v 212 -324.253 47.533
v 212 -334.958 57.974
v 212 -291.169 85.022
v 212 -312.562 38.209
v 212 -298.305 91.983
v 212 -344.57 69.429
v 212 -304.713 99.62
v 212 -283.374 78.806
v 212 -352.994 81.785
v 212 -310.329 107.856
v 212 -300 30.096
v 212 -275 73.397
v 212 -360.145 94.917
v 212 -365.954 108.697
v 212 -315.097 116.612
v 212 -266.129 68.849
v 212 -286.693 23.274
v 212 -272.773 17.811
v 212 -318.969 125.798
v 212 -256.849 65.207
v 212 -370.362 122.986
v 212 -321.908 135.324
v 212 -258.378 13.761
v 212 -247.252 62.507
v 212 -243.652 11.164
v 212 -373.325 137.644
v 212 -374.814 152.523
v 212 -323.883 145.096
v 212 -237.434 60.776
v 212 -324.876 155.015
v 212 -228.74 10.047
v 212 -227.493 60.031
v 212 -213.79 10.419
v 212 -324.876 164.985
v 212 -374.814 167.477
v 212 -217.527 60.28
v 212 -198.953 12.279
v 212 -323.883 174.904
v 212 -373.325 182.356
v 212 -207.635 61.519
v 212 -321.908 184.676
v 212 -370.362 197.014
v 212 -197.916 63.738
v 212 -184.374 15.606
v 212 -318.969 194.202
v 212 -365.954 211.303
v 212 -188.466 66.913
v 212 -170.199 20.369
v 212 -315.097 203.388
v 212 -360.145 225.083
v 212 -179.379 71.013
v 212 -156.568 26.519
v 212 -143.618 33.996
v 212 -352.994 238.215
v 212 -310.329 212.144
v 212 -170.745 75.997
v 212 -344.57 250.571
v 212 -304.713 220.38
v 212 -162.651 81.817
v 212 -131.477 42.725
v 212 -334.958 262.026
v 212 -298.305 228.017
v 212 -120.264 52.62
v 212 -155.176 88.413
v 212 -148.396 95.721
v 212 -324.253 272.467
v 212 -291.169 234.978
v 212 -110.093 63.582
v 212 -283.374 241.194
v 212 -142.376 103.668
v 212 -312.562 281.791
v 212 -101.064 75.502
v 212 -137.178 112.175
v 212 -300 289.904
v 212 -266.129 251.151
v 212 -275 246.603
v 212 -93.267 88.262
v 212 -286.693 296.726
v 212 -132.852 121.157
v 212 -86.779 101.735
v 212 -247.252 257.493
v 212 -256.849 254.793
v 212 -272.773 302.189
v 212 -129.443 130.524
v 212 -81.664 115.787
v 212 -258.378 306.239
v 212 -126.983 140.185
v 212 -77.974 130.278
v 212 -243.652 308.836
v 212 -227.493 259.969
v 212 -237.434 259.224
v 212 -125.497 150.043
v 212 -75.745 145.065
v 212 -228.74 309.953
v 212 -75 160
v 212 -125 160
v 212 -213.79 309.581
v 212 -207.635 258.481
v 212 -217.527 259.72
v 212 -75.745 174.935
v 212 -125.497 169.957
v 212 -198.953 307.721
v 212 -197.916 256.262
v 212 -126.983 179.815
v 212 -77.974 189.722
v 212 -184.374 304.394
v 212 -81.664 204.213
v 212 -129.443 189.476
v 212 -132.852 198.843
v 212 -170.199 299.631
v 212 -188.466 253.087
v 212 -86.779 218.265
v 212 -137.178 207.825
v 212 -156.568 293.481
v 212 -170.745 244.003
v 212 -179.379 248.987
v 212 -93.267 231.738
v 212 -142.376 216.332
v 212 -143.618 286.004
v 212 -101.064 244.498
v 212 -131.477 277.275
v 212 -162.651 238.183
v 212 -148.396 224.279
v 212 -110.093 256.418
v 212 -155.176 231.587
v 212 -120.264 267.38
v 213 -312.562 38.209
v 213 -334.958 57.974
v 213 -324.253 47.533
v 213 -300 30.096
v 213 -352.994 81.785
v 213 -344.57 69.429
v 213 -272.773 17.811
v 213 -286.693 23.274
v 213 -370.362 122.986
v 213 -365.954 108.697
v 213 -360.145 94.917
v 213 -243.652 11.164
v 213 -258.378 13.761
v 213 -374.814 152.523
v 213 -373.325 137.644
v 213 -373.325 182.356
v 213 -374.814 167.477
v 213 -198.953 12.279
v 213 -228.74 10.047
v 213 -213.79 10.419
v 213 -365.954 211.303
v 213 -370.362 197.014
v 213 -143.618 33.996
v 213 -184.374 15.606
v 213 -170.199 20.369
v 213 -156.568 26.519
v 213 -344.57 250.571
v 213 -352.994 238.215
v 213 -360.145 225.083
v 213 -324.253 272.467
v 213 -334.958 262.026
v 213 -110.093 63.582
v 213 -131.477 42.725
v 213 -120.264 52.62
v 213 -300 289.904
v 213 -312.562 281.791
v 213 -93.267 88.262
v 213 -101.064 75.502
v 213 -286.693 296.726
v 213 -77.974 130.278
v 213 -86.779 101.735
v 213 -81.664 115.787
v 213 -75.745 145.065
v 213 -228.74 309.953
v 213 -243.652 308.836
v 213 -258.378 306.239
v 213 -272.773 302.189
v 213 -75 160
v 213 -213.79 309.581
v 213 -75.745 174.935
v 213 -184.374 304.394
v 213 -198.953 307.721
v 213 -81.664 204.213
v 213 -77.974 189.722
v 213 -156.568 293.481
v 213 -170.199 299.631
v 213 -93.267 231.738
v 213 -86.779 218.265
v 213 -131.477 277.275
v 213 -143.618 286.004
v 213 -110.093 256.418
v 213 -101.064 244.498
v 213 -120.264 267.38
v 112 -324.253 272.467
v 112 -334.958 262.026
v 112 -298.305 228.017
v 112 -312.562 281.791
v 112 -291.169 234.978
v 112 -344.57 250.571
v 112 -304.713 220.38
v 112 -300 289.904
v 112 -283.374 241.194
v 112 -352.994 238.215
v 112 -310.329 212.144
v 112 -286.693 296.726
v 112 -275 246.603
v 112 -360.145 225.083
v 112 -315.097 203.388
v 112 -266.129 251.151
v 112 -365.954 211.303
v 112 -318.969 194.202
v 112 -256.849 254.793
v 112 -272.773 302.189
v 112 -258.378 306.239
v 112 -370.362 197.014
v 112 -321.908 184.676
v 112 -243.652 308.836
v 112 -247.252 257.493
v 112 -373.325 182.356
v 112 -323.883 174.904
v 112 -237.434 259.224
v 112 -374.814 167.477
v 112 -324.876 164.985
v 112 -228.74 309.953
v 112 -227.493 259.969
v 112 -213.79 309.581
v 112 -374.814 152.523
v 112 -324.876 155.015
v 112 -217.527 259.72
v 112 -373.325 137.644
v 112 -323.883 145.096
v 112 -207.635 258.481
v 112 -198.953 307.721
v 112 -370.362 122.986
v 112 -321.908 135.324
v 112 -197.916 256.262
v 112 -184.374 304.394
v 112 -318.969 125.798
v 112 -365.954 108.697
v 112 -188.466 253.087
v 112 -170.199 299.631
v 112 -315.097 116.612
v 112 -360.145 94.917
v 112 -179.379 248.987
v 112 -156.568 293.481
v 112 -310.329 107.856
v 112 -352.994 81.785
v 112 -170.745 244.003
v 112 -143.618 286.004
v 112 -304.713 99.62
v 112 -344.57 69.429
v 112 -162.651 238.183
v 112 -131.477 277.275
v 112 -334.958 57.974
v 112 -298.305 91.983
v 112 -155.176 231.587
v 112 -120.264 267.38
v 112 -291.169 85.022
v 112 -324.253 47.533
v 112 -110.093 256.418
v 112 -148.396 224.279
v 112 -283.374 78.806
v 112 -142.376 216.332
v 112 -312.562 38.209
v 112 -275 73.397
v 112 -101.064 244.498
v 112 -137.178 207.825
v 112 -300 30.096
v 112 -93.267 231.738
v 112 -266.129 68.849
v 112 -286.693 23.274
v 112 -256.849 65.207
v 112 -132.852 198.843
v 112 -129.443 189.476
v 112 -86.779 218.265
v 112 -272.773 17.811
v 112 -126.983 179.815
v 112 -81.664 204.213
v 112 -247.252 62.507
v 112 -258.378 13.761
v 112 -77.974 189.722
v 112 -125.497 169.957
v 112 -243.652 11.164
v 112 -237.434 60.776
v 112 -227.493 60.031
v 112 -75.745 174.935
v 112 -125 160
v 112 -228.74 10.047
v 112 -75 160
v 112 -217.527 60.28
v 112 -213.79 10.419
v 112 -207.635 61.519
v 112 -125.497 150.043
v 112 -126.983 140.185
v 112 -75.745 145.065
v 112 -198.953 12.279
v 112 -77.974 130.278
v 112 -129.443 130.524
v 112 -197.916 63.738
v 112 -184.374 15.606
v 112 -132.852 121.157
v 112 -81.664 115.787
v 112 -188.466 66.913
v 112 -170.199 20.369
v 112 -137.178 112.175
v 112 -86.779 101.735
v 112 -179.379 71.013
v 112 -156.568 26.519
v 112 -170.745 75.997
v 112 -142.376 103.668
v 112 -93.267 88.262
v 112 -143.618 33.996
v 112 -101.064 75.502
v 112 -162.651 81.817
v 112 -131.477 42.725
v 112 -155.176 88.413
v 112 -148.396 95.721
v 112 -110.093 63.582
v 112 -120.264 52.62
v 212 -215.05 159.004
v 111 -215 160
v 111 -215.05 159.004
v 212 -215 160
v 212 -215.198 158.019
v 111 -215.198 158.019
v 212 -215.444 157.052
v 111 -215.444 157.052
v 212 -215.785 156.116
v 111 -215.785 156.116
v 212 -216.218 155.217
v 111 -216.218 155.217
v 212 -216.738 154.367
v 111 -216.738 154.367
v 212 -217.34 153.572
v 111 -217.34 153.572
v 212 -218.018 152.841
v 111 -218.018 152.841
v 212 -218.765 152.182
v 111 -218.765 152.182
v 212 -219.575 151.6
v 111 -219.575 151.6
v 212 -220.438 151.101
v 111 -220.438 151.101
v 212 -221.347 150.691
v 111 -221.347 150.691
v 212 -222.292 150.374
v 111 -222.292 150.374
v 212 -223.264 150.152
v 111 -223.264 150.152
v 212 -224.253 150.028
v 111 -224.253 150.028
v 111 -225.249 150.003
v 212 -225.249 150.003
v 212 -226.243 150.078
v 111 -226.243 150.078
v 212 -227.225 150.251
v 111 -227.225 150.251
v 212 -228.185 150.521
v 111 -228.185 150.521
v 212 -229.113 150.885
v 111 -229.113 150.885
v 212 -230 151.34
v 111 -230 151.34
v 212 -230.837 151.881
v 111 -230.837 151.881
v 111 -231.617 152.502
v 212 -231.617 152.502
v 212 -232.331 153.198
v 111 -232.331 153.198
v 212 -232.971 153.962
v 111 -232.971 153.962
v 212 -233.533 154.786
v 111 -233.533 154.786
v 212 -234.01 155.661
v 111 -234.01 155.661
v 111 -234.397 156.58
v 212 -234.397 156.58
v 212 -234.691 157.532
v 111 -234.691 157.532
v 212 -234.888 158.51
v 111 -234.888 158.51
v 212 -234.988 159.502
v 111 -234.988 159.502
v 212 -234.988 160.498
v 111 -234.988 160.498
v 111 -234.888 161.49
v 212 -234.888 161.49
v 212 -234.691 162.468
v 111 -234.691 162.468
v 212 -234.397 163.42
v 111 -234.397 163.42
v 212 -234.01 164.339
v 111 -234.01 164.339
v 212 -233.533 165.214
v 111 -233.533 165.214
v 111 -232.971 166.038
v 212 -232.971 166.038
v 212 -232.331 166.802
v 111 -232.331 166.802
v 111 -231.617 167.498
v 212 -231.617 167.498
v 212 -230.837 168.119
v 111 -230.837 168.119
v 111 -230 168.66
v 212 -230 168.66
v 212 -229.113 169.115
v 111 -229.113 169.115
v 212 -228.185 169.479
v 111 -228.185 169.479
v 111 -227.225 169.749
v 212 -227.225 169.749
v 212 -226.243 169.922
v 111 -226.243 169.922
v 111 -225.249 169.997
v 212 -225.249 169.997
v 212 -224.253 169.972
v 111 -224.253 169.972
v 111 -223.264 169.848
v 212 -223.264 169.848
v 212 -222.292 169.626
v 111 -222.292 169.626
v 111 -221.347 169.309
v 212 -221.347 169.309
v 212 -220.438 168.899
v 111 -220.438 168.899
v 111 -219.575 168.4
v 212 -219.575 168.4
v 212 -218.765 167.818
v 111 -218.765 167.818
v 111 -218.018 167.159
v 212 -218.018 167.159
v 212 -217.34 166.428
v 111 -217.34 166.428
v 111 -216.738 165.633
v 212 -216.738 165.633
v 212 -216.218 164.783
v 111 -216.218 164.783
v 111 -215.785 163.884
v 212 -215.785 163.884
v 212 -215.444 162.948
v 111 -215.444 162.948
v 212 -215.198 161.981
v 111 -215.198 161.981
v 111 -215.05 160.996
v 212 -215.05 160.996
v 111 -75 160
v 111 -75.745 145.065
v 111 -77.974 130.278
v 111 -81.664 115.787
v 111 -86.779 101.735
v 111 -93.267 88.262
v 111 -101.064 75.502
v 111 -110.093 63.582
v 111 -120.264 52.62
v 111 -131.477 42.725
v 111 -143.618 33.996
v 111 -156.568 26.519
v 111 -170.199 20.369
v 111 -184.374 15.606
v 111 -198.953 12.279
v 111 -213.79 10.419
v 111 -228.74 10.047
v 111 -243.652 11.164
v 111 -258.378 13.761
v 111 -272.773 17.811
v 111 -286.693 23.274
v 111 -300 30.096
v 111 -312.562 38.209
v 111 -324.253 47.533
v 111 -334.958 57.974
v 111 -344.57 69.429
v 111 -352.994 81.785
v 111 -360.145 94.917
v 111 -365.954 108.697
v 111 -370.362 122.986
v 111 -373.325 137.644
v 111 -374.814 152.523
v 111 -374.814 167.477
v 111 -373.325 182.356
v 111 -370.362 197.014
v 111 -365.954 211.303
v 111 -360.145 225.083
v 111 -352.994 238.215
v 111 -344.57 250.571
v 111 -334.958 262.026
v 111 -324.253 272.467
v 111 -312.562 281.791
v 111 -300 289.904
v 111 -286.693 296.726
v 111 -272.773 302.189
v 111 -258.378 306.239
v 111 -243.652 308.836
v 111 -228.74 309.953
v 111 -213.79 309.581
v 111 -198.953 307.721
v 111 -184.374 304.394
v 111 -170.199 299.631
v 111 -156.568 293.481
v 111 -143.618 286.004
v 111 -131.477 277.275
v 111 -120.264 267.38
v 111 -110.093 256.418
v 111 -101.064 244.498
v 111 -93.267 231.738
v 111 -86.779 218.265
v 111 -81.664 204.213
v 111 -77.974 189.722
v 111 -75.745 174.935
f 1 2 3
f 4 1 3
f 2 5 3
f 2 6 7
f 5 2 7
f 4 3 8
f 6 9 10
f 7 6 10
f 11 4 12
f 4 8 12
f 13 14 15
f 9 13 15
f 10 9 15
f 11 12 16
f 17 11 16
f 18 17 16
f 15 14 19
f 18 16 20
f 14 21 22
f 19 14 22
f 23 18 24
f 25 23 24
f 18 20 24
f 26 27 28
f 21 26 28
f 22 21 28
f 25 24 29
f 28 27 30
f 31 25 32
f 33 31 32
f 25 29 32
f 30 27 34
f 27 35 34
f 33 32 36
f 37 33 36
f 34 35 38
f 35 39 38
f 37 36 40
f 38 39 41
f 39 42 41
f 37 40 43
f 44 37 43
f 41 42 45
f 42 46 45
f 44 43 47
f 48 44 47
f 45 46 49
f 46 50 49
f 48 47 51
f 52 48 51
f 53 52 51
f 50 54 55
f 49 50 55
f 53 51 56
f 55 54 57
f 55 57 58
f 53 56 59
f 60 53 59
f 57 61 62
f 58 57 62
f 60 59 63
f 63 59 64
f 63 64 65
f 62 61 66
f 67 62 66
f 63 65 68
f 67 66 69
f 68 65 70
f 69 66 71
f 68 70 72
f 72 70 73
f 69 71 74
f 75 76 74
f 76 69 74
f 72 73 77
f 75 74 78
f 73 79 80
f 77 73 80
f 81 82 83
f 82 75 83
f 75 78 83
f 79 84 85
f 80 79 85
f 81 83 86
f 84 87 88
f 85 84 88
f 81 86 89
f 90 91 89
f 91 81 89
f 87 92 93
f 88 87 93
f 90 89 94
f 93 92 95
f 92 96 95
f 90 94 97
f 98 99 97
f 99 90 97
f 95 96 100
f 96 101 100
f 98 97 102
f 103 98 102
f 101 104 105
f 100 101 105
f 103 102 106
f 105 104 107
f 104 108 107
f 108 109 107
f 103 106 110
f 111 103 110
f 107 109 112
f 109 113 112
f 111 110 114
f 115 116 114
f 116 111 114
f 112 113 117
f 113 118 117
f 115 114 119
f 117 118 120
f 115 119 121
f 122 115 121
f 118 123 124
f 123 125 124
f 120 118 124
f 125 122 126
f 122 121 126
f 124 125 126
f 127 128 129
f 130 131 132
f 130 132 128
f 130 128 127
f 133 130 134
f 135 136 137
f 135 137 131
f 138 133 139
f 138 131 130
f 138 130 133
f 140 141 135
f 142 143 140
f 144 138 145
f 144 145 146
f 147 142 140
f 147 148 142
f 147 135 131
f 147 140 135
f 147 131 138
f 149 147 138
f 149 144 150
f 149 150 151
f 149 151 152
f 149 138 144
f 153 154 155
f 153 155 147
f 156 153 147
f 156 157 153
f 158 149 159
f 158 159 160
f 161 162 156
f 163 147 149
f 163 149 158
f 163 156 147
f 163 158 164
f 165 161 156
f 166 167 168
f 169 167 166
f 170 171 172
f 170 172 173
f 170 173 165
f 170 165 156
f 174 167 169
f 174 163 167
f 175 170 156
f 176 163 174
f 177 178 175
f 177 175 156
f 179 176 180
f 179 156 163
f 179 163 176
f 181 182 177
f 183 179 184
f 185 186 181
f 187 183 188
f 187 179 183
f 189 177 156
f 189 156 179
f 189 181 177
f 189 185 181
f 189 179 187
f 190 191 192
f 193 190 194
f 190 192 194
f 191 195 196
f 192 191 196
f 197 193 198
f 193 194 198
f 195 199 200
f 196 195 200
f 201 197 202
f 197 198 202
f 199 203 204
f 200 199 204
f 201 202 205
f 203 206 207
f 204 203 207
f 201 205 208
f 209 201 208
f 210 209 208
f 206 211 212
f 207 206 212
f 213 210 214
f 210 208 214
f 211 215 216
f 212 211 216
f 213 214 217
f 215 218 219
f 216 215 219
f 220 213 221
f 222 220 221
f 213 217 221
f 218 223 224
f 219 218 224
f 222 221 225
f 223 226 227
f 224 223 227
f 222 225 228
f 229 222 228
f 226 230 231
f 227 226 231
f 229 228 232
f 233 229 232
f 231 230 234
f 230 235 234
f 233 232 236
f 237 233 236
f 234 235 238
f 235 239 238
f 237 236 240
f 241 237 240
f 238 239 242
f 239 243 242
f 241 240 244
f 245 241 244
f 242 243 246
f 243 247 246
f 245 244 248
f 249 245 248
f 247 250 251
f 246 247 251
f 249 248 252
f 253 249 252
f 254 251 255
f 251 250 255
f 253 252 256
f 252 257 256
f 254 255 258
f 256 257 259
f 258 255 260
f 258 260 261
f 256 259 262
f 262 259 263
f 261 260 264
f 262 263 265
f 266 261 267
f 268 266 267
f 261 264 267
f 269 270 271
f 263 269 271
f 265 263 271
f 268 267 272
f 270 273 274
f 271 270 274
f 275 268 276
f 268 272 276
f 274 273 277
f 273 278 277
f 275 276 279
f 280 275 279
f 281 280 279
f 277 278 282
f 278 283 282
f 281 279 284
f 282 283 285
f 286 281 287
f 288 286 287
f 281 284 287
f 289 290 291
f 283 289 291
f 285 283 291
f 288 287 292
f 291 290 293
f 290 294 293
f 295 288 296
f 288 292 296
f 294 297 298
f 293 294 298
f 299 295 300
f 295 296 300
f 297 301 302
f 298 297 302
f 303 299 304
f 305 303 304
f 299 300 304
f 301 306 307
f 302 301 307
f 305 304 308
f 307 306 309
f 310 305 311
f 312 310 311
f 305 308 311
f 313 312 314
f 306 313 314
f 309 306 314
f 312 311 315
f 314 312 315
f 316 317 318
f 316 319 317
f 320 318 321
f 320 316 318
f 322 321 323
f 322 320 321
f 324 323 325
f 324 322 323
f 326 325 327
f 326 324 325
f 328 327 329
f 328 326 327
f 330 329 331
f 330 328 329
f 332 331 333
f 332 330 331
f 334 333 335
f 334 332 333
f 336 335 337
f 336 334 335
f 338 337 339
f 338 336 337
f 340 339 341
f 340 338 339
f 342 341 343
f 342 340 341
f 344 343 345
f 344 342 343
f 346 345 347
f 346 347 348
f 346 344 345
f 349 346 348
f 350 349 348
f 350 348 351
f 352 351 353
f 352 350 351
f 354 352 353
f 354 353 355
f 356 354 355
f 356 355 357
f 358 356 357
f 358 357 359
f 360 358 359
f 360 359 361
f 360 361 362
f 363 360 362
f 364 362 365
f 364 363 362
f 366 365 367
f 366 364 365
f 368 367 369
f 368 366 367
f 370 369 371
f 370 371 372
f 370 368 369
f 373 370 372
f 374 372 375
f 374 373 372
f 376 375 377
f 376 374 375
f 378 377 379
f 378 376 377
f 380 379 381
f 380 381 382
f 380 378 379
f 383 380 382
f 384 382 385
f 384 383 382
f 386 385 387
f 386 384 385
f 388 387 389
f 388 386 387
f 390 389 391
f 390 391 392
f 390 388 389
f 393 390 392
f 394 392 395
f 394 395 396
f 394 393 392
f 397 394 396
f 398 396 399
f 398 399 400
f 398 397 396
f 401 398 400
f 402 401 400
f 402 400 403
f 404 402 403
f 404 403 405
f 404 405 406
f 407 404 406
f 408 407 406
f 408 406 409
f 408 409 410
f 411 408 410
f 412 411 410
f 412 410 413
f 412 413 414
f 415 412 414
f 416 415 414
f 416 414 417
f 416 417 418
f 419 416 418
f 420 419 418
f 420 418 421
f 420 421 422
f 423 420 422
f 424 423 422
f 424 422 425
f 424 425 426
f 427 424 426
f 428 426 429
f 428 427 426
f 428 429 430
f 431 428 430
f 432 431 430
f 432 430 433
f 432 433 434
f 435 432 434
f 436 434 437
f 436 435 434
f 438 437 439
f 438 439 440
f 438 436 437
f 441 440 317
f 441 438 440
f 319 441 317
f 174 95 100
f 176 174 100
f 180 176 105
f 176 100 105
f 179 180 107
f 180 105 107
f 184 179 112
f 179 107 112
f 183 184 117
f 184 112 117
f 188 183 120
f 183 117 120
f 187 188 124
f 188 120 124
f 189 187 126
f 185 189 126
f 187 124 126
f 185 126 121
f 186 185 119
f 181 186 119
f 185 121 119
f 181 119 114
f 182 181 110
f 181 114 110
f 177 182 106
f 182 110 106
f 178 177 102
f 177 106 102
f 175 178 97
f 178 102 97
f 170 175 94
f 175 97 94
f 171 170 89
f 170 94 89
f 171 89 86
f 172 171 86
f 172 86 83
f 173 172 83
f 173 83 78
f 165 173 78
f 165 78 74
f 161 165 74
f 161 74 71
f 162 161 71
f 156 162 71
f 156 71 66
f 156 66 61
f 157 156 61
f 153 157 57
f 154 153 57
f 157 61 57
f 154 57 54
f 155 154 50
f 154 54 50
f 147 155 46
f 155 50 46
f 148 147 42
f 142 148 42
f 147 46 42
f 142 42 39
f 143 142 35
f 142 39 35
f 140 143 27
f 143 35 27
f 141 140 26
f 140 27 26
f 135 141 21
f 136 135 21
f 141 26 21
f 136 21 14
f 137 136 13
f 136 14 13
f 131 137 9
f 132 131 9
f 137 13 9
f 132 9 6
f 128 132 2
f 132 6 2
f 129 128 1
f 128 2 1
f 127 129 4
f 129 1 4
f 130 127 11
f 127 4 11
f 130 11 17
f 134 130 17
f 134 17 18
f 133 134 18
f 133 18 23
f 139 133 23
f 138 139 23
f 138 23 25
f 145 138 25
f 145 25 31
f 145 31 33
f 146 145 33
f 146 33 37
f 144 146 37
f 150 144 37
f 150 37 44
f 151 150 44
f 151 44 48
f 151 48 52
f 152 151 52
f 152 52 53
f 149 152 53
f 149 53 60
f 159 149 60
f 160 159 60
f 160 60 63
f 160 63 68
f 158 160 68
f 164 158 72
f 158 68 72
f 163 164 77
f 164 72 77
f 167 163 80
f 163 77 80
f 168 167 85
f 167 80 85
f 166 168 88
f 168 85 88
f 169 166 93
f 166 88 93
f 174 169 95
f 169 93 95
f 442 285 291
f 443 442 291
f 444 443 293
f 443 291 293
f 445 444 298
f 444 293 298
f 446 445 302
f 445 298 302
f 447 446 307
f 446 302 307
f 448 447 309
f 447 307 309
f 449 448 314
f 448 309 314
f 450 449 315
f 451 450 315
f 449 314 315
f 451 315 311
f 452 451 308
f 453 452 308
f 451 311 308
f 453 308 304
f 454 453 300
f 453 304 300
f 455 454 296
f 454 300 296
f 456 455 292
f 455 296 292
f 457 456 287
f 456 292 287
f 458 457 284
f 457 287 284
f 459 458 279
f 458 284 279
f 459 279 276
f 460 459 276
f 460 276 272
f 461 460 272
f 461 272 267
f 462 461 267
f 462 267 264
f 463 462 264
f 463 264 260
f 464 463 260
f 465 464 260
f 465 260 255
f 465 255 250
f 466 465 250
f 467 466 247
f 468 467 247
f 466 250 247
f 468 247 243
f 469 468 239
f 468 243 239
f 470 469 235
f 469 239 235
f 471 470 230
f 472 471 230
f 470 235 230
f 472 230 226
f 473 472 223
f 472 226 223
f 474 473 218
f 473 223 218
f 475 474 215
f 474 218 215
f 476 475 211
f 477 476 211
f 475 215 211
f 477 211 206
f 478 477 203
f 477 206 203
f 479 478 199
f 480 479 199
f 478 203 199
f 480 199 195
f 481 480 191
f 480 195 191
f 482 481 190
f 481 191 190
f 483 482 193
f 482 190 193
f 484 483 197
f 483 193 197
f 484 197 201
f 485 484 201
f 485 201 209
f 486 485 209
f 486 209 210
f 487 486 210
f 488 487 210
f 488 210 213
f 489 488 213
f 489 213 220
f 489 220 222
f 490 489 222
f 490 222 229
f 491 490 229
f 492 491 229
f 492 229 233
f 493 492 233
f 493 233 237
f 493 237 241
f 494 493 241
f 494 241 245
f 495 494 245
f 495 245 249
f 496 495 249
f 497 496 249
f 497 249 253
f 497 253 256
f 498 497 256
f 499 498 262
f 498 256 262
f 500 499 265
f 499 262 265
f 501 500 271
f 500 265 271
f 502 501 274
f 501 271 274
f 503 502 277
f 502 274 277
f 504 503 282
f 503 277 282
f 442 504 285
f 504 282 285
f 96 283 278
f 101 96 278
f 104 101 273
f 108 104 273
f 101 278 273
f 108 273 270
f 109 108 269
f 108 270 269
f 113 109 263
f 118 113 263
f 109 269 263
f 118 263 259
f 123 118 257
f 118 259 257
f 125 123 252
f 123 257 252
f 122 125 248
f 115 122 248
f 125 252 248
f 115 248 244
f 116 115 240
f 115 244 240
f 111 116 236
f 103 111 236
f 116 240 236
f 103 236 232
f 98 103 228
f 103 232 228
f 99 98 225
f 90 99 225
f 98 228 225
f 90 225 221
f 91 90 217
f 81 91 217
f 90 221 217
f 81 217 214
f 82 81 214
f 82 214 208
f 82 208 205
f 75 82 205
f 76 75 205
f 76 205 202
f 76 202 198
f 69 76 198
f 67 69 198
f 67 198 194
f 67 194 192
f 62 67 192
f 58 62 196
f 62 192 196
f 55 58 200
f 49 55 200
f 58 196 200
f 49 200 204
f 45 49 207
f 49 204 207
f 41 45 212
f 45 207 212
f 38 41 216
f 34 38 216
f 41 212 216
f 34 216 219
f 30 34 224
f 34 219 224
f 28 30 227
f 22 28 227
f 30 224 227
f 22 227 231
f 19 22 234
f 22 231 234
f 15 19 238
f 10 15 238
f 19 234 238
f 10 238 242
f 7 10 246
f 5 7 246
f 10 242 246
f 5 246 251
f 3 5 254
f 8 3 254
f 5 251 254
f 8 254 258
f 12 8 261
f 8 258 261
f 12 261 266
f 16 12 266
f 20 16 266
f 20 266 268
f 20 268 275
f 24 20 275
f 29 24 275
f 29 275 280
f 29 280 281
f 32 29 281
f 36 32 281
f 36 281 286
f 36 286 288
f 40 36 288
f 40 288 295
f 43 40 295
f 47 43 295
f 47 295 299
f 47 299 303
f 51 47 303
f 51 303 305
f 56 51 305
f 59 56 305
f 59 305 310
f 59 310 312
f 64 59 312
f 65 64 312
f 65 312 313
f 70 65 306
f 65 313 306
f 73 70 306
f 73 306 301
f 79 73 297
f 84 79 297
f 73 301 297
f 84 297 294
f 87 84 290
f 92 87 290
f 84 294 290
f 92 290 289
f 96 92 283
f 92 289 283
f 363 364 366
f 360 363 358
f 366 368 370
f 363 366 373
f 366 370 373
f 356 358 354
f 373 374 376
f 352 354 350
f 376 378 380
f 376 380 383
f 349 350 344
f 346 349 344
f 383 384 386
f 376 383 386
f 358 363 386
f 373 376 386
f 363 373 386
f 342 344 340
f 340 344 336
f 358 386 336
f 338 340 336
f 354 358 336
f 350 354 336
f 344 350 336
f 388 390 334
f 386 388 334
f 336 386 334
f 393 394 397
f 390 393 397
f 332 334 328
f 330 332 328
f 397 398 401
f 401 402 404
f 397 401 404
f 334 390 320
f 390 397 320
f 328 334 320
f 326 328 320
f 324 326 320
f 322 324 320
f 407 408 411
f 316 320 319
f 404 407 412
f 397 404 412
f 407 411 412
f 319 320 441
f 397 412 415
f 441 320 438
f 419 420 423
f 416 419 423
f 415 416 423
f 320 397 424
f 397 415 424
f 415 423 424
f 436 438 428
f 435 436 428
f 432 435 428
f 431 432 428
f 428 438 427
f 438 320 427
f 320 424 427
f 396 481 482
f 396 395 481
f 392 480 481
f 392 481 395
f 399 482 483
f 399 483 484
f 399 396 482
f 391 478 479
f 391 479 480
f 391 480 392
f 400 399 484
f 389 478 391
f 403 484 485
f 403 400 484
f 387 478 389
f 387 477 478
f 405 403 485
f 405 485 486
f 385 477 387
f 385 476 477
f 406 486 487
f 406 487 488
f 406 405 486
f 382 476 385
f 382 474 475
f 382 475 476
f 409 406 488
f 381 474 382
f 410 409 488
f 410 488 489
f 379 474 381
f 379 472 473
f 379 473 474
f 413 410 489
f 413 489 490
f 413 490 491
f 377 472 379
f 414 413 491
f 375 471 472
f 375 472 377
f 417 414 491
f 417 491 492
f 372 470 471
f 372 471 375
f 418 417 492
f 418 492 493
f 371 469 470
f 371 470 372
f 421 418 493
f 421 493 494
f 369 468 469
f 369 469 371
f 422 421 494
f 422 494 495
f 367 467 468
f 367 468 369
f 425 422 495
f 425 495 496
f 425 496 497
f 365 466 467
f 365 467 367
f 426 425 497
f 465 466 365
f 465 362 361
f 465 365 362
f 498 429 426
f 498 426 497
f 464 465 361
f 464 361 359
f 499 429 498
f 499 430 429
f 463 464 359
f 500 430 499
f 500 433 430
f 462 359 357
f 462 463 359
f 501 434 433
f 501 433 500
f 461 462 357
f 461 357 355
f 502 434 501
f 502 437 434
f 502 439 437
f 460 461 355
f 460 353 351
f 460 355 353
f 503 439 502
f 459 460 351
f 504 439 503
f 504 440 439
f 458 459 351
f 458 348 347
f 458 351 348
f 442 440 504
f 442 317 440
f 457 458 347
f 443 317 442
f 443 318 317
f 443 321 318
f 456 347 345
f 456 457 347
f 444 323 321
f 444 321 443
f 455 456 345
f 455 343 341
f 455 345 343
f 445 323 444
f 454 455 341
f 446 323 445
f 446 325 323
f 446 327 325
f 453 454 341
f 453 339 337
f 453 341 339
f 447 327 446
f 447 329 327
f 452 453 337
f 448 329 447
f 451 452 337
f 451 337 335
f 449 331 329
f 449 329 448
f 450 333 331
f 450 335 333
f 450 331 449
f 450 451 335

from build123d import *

# Parameters (mm, degrees)
SKETCH012_R   = 100
SKETCH012_R_2 = 10
PAD009_DEPTH  = 100
SKETCH013_R   = 150
SKETCH013_R_2 = 10
PAD011_DEPTH  = 1
SKETCH014_R   = 150
PAD010_DEPTH  = 1


with BuildPart() as part:
    # Sketch012 → Pad009 (new body)
    with BuildSketch(Plane.YZ):
        Circle(SKETCH012_R)
        Circle(SKETCH012_R_2, mode=Mode.SUBTRACT)
    extrude(amount=PAD009_DEPTH)

    # Sketch013 (on Face3 of Pad009) → Pad011 (join)
    with BuildSketch(Plane(origin=(0, 0, 0), x_dir=(0, 1, 0), z_dir=(-1, 0, 0))):
        Circle(SKETCH013_R)
        Circle(SKETCH013_R_2, mode=Mode.SUBTRACT)
    extrude(amount=PAD011_DEPTH)

    # Sketch014 (on Face3 of Pad011) → Pad010 (join)
    with BuildSketch(Plane.YZ.offset(100)):
        Circle(SKETCH014_R)
    extrude(amount=PAD010_DEPTH)


with BuildPart() as part_1:
    # Body004 placement: moved
    add(part.part.moved(Location((112, -225, 160))))


solid = part_1.part
